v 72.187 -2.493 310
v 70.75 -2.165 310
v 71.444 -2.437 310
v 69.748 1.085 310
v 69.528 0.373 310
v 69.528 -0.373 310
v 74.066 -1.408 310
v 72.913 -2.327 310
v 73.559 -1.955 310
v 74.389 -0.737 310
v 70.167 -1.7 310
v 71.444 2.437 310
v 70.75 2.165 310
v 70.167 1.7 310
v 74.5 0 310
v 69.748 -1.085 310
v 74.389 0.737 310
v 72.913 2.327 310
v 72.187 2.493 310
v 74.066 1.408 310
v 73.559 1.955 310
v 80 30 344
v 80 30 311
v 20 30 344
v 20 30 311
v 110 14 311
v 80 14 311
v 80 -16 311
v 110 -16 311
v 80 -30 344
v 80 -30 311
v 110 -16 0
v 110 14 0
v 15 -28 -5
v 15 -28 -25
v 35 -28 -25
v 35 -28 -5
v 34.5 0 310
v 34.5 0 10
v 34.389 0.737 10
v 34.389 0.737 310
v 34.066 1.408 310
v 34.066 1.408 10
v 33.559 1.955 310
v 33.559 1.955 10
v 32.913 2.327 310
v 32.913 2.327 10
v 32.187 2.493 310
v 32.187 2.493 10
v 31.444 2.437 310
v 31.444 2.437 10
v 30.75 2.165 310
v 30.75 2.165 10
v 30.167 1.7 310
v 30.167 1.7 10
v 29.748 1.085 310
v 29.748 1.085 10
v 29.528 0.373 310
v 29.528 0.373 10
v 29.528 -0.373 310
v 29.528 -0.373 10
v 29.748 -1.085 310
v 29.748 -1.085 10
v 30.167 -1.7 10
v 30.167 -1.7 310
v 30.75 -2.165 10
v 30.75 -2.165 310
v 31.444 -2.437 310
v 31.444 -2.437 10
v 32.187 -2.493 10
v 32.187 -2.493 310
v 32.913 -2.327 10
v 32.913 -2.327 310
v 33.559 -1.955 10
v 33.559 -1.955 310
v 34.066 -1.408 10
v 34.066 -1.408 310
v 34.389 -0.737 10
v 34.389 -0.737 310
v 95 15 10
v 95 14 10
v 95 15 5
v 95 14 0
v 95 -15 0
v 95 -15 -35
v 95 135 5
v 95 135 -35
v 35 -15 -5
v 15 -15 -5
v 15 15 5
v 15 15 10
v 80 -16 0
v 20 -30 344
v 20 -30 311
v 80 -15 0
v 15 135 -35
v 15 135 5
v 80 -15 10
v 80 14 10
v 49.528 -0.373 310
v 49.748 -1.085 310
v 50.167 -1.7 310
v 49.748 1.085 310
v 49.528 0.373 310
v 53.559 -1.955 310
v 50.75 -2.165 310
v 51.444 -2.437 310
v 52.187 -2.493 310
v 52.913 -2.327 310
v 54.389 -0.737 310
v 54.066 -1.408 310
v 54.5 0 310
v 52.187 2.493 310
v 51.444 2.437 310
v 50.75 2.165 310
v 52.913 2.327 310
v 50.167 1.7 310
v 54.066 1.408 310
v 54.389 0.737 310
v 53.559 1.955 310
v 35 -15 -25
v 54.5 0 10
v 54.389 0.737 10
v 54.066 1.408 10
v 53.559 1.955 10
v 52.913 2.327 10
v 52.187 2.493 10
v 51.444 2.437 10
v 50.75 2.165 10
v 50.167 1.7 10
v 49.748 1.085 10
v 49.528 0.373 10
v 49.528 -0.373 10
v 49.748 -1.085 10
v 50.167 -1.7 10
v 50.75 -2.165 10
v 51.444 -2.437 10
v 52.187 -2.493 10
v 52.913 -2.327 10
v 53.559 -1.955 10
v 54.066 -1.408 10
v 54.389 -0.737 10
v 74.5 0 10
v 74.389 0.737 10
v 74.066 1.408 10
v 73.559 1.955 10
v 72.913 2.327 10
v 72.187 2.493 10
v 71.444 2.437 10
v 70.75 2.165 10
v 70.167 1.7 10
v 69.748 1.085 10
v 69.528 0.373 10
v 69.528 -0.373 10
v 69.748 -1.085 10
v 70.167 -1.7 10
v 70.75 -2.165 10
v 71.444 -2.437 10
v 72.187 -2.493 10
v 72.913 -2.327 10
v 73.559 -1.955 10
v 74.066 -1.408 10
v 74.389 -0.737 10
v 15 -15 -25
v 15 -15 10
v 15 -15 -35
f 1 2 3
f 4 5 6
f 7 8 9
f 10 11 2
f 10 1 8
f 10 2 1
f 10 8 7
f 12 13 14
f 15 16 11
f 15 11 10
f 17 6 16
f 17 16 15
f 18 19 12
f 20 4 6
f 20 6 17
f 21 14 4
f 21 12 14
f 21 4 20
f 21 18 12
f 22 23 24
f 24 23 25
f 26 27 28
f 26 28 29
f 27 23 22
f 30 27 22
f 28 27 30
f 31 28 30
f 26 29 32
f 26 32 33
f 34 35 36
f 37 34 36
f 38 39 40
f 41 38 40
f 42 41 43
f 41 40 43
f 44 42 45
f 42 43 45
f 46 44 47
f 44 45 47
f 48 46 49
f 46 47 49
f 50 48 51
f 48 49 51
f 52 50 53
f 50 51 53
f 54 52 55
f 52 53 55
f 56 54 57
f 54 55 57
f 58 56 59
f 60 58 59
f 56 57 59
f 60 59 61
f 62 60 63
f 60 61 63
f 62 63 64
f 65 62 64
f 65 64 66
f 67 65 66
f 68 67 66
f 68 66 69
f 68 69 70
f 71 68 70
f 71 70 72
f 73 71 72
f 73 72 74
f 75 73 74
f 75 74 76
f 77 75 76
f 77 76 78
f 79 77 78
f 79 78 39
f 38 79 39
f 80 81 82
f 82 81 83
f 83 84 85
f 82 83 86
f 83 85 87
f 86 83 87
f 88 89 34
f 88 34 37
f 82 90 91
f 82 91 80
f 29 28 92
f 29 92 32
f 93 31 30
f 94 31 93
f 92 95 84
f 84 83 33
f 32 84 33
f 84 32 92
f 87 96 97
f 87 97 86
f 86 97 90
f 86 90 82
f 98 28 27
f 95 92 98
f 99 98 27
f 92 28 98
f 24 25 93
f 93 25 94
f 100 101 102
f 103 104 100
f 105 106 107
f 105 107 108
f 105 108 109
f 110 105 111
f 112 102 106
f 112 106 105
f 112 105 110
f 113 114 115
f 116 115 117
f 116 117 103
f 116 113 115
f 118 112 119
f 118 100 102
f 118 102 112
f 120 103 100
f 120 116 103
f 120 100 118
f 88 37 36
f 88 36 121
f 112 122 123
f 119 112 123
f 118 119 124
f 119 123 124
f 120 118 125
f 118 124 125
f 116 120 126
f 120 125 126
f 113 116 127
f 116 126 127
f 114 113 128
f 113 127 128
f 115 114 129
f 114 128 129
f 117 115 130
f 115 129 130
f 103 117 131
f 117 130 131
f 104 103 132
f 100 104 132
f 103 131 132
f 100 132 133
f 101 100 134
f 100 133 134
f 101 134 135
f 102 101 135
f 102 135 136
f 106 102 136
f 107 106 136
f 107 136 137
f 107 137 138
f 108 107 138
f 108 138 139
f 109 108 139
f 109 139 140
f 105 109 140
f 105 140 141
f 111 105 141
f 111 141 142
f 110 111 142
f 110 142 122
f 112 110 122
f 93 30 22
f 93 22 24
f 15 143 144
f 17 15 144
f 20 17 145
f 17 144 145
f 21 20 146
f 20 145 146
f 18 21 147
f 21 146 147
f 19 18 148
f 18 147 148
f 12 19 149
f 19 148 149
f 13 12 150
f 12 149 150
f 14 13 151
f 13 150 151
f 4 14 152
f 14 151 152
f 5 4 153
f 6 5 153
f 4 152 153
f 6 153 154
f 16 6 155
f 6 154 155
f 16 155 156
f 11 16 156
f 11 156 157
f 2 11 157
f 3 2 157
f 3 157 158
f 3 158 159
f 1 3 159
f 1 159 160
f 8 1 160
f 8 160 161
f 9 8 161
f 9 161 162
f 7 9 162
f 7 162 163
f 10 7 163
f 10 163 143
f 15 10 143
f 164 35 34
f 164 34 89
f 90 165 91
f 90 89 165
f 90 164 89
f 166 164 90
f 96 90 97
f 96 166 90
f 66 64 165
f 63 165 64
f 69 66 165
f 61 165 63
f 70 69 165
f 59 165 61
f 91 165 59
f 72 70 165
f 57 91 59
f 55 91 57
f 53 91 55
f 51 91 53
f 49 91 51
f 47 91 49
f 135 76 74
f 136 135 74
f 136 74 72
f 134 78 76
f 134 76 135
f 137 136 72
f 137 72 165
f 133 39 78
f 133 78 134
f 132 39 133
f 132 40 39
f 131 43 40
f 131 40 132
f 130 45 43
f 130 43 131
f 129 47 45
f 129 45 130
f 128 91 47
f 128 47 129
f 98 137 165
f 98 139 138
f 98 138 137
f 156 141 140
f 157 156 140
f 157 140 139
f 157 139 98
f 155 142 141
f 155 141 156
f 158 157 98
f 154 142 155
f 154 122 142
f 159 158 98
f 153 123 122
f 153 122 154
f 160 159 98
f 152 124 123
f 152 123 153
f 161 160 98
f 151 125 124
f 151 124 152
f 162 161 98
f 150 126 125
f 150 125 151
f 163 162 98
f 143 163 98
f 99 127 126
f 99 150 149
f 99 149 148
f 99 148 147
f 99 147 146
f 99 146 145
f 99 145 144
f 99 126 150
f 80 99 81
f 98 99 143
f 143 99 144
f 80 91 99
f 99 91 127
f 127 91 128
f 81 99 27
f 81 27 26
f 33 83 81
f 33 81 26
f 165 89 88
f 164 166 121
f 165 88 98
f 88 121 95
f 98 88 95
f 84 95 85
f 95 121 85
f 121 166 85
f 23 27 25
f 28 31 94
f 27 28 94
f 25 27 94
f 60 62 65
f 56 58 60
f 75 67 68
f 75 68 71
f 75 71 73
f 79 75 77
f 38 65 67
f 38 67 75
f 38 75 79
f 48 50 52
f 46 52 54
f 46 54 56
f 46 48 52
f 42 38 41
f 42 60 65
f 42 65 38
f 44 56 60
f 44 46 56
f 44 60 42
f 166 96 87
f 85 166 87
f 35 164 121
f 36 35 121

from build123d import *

# Parameters (mm, degrees)
BOX002_W          = 80
BOX002_H          = 150
BOX002_DEPTH      = 40
CYLINDER_R        = 2.5
CYLINDER_DEPTH    = 310
CYLINDER001_R     = 2.5
CYLINDER001_DEPTH = 310
CYLINDER002_R     = 2.5
CYLINDER002_DEPTH = 310
BOX009_W          = 60
BOX009_H          = 60
BOX009_DEPTH      = 33
BOX025_W          = 80
BOX025_H          = 30
BOX025_DEPTH      = 40
BOX033_W          = 20
BOX033_H          = 13
BOX033_DEPTH      = 20
BOX001_W          = 30
BOX001_H          = 30
BOX001_DEPTH      = 311


with BuildPart() as electronicsbox:
    # Box002 → Box002 (new body)
    with BuildSketch(Plane(origin=(15, -15, -35), x_dir=(1, 0, 0), z_dir=(0, 0, 1))):
        with Locations((40, 75)):
            Rectangle(BOX002_W, BOX002_H)
    extrude(amount=BOX002_DEPTH)


with BuildPart() as innerzrail:
    # Cylinder → Cylinder (new body)
    with BuildSketch(Plane(origin=(32, 0, 0), x_dir=(1, 0, 0), z_dir=(0, 0, 1))):
        Circle(CYLINDER_R)
    extrude(amount=CYLINDER_DEPTH)


with BuildPart() as outerzrail:
    # Cylinder001 → Cylinder001 (new body)
    with BuildSketch(Plane(origin=(72, 0, 0), x_dir=(1, 0, 0), z_dir=(0, 0, 1))):
        Circle(CYLINDER001_R)
    extrude(amount=CYLINDER001_DEPTH)


with BuildPart() as zspindle:
    # Cylinder002 → Cylinder002 (new body)
    with BuildSketch(Plane(origin=(52, 0, 0), x_dir=(1, 0, 0), z_dir=(0, 0, 1))):
        Circle(CYLINDER002_R)
    extrude(amount=CYLINDER002_DEPTH)


with BuildPart() as zmotor:
    # Box009 → Box009 (new body)
    with BuildSketch(Plane(origin=(80, 30, 311), x_dir=(-1, 0, 0), z_dir=(0, 0, 1))):
        with Locations((30, 30)):
            Rectangle(BOX009_W, BOX009_H)
    extrude(amount=BOX009_DEPTH)


with BuildPart() as zbeamfixture:
    # Box025 → Box025 (new body)
    with BuildSketch(Plane(origin=(15, -15, -30), x_dir=(1, 0, 0), z_dir=(0, 0, 1))):
        with Locations((40, 15)):
            Rectangle(BOX025_W, BOX025_H)
    extrude(amount=BOX025_DEPTH)


with BuildPart() as mountblock:
    # Box033 → Box033 (new body)
    with BuildSketch(Plane(origin=(15, -28, -25), x_dir=(1, 0, 0), z_dir=(0, 0, 1))):
        with Locations((10, 6.5)):
            Rectangle(BOX033_W, BOX033_H)
    extrude(amount=BOX033_DEPTH)


with BuildPart() as prusamini_zbeam:
    # Box001 → Box001 (new body)
    with BuildSketch(Plane(origin=(80, -16, 0), x_dir=(1, 0, 0), z_dir=(0, 0, 1))):
        with Locations((15, 15)):
            Rectangle(BOX001_W, BOX001_H)
    extrude(amount=BOX001_DEPTH)

    # Fusion: union ElectronicsBox, InnerZRail, OuterZRail, ZSpindle, ZMotor, ZBeamFixture, MountBlock
    add(electronicsbox.part)
    add(innerzrail.part)
    add(outerzrail.part)
    add(zspindle.part)
    add(zmotor.part)
    add(zbeamfixture.part)
    add(mountblock.part)


solid = prusamini_zbeam.part
